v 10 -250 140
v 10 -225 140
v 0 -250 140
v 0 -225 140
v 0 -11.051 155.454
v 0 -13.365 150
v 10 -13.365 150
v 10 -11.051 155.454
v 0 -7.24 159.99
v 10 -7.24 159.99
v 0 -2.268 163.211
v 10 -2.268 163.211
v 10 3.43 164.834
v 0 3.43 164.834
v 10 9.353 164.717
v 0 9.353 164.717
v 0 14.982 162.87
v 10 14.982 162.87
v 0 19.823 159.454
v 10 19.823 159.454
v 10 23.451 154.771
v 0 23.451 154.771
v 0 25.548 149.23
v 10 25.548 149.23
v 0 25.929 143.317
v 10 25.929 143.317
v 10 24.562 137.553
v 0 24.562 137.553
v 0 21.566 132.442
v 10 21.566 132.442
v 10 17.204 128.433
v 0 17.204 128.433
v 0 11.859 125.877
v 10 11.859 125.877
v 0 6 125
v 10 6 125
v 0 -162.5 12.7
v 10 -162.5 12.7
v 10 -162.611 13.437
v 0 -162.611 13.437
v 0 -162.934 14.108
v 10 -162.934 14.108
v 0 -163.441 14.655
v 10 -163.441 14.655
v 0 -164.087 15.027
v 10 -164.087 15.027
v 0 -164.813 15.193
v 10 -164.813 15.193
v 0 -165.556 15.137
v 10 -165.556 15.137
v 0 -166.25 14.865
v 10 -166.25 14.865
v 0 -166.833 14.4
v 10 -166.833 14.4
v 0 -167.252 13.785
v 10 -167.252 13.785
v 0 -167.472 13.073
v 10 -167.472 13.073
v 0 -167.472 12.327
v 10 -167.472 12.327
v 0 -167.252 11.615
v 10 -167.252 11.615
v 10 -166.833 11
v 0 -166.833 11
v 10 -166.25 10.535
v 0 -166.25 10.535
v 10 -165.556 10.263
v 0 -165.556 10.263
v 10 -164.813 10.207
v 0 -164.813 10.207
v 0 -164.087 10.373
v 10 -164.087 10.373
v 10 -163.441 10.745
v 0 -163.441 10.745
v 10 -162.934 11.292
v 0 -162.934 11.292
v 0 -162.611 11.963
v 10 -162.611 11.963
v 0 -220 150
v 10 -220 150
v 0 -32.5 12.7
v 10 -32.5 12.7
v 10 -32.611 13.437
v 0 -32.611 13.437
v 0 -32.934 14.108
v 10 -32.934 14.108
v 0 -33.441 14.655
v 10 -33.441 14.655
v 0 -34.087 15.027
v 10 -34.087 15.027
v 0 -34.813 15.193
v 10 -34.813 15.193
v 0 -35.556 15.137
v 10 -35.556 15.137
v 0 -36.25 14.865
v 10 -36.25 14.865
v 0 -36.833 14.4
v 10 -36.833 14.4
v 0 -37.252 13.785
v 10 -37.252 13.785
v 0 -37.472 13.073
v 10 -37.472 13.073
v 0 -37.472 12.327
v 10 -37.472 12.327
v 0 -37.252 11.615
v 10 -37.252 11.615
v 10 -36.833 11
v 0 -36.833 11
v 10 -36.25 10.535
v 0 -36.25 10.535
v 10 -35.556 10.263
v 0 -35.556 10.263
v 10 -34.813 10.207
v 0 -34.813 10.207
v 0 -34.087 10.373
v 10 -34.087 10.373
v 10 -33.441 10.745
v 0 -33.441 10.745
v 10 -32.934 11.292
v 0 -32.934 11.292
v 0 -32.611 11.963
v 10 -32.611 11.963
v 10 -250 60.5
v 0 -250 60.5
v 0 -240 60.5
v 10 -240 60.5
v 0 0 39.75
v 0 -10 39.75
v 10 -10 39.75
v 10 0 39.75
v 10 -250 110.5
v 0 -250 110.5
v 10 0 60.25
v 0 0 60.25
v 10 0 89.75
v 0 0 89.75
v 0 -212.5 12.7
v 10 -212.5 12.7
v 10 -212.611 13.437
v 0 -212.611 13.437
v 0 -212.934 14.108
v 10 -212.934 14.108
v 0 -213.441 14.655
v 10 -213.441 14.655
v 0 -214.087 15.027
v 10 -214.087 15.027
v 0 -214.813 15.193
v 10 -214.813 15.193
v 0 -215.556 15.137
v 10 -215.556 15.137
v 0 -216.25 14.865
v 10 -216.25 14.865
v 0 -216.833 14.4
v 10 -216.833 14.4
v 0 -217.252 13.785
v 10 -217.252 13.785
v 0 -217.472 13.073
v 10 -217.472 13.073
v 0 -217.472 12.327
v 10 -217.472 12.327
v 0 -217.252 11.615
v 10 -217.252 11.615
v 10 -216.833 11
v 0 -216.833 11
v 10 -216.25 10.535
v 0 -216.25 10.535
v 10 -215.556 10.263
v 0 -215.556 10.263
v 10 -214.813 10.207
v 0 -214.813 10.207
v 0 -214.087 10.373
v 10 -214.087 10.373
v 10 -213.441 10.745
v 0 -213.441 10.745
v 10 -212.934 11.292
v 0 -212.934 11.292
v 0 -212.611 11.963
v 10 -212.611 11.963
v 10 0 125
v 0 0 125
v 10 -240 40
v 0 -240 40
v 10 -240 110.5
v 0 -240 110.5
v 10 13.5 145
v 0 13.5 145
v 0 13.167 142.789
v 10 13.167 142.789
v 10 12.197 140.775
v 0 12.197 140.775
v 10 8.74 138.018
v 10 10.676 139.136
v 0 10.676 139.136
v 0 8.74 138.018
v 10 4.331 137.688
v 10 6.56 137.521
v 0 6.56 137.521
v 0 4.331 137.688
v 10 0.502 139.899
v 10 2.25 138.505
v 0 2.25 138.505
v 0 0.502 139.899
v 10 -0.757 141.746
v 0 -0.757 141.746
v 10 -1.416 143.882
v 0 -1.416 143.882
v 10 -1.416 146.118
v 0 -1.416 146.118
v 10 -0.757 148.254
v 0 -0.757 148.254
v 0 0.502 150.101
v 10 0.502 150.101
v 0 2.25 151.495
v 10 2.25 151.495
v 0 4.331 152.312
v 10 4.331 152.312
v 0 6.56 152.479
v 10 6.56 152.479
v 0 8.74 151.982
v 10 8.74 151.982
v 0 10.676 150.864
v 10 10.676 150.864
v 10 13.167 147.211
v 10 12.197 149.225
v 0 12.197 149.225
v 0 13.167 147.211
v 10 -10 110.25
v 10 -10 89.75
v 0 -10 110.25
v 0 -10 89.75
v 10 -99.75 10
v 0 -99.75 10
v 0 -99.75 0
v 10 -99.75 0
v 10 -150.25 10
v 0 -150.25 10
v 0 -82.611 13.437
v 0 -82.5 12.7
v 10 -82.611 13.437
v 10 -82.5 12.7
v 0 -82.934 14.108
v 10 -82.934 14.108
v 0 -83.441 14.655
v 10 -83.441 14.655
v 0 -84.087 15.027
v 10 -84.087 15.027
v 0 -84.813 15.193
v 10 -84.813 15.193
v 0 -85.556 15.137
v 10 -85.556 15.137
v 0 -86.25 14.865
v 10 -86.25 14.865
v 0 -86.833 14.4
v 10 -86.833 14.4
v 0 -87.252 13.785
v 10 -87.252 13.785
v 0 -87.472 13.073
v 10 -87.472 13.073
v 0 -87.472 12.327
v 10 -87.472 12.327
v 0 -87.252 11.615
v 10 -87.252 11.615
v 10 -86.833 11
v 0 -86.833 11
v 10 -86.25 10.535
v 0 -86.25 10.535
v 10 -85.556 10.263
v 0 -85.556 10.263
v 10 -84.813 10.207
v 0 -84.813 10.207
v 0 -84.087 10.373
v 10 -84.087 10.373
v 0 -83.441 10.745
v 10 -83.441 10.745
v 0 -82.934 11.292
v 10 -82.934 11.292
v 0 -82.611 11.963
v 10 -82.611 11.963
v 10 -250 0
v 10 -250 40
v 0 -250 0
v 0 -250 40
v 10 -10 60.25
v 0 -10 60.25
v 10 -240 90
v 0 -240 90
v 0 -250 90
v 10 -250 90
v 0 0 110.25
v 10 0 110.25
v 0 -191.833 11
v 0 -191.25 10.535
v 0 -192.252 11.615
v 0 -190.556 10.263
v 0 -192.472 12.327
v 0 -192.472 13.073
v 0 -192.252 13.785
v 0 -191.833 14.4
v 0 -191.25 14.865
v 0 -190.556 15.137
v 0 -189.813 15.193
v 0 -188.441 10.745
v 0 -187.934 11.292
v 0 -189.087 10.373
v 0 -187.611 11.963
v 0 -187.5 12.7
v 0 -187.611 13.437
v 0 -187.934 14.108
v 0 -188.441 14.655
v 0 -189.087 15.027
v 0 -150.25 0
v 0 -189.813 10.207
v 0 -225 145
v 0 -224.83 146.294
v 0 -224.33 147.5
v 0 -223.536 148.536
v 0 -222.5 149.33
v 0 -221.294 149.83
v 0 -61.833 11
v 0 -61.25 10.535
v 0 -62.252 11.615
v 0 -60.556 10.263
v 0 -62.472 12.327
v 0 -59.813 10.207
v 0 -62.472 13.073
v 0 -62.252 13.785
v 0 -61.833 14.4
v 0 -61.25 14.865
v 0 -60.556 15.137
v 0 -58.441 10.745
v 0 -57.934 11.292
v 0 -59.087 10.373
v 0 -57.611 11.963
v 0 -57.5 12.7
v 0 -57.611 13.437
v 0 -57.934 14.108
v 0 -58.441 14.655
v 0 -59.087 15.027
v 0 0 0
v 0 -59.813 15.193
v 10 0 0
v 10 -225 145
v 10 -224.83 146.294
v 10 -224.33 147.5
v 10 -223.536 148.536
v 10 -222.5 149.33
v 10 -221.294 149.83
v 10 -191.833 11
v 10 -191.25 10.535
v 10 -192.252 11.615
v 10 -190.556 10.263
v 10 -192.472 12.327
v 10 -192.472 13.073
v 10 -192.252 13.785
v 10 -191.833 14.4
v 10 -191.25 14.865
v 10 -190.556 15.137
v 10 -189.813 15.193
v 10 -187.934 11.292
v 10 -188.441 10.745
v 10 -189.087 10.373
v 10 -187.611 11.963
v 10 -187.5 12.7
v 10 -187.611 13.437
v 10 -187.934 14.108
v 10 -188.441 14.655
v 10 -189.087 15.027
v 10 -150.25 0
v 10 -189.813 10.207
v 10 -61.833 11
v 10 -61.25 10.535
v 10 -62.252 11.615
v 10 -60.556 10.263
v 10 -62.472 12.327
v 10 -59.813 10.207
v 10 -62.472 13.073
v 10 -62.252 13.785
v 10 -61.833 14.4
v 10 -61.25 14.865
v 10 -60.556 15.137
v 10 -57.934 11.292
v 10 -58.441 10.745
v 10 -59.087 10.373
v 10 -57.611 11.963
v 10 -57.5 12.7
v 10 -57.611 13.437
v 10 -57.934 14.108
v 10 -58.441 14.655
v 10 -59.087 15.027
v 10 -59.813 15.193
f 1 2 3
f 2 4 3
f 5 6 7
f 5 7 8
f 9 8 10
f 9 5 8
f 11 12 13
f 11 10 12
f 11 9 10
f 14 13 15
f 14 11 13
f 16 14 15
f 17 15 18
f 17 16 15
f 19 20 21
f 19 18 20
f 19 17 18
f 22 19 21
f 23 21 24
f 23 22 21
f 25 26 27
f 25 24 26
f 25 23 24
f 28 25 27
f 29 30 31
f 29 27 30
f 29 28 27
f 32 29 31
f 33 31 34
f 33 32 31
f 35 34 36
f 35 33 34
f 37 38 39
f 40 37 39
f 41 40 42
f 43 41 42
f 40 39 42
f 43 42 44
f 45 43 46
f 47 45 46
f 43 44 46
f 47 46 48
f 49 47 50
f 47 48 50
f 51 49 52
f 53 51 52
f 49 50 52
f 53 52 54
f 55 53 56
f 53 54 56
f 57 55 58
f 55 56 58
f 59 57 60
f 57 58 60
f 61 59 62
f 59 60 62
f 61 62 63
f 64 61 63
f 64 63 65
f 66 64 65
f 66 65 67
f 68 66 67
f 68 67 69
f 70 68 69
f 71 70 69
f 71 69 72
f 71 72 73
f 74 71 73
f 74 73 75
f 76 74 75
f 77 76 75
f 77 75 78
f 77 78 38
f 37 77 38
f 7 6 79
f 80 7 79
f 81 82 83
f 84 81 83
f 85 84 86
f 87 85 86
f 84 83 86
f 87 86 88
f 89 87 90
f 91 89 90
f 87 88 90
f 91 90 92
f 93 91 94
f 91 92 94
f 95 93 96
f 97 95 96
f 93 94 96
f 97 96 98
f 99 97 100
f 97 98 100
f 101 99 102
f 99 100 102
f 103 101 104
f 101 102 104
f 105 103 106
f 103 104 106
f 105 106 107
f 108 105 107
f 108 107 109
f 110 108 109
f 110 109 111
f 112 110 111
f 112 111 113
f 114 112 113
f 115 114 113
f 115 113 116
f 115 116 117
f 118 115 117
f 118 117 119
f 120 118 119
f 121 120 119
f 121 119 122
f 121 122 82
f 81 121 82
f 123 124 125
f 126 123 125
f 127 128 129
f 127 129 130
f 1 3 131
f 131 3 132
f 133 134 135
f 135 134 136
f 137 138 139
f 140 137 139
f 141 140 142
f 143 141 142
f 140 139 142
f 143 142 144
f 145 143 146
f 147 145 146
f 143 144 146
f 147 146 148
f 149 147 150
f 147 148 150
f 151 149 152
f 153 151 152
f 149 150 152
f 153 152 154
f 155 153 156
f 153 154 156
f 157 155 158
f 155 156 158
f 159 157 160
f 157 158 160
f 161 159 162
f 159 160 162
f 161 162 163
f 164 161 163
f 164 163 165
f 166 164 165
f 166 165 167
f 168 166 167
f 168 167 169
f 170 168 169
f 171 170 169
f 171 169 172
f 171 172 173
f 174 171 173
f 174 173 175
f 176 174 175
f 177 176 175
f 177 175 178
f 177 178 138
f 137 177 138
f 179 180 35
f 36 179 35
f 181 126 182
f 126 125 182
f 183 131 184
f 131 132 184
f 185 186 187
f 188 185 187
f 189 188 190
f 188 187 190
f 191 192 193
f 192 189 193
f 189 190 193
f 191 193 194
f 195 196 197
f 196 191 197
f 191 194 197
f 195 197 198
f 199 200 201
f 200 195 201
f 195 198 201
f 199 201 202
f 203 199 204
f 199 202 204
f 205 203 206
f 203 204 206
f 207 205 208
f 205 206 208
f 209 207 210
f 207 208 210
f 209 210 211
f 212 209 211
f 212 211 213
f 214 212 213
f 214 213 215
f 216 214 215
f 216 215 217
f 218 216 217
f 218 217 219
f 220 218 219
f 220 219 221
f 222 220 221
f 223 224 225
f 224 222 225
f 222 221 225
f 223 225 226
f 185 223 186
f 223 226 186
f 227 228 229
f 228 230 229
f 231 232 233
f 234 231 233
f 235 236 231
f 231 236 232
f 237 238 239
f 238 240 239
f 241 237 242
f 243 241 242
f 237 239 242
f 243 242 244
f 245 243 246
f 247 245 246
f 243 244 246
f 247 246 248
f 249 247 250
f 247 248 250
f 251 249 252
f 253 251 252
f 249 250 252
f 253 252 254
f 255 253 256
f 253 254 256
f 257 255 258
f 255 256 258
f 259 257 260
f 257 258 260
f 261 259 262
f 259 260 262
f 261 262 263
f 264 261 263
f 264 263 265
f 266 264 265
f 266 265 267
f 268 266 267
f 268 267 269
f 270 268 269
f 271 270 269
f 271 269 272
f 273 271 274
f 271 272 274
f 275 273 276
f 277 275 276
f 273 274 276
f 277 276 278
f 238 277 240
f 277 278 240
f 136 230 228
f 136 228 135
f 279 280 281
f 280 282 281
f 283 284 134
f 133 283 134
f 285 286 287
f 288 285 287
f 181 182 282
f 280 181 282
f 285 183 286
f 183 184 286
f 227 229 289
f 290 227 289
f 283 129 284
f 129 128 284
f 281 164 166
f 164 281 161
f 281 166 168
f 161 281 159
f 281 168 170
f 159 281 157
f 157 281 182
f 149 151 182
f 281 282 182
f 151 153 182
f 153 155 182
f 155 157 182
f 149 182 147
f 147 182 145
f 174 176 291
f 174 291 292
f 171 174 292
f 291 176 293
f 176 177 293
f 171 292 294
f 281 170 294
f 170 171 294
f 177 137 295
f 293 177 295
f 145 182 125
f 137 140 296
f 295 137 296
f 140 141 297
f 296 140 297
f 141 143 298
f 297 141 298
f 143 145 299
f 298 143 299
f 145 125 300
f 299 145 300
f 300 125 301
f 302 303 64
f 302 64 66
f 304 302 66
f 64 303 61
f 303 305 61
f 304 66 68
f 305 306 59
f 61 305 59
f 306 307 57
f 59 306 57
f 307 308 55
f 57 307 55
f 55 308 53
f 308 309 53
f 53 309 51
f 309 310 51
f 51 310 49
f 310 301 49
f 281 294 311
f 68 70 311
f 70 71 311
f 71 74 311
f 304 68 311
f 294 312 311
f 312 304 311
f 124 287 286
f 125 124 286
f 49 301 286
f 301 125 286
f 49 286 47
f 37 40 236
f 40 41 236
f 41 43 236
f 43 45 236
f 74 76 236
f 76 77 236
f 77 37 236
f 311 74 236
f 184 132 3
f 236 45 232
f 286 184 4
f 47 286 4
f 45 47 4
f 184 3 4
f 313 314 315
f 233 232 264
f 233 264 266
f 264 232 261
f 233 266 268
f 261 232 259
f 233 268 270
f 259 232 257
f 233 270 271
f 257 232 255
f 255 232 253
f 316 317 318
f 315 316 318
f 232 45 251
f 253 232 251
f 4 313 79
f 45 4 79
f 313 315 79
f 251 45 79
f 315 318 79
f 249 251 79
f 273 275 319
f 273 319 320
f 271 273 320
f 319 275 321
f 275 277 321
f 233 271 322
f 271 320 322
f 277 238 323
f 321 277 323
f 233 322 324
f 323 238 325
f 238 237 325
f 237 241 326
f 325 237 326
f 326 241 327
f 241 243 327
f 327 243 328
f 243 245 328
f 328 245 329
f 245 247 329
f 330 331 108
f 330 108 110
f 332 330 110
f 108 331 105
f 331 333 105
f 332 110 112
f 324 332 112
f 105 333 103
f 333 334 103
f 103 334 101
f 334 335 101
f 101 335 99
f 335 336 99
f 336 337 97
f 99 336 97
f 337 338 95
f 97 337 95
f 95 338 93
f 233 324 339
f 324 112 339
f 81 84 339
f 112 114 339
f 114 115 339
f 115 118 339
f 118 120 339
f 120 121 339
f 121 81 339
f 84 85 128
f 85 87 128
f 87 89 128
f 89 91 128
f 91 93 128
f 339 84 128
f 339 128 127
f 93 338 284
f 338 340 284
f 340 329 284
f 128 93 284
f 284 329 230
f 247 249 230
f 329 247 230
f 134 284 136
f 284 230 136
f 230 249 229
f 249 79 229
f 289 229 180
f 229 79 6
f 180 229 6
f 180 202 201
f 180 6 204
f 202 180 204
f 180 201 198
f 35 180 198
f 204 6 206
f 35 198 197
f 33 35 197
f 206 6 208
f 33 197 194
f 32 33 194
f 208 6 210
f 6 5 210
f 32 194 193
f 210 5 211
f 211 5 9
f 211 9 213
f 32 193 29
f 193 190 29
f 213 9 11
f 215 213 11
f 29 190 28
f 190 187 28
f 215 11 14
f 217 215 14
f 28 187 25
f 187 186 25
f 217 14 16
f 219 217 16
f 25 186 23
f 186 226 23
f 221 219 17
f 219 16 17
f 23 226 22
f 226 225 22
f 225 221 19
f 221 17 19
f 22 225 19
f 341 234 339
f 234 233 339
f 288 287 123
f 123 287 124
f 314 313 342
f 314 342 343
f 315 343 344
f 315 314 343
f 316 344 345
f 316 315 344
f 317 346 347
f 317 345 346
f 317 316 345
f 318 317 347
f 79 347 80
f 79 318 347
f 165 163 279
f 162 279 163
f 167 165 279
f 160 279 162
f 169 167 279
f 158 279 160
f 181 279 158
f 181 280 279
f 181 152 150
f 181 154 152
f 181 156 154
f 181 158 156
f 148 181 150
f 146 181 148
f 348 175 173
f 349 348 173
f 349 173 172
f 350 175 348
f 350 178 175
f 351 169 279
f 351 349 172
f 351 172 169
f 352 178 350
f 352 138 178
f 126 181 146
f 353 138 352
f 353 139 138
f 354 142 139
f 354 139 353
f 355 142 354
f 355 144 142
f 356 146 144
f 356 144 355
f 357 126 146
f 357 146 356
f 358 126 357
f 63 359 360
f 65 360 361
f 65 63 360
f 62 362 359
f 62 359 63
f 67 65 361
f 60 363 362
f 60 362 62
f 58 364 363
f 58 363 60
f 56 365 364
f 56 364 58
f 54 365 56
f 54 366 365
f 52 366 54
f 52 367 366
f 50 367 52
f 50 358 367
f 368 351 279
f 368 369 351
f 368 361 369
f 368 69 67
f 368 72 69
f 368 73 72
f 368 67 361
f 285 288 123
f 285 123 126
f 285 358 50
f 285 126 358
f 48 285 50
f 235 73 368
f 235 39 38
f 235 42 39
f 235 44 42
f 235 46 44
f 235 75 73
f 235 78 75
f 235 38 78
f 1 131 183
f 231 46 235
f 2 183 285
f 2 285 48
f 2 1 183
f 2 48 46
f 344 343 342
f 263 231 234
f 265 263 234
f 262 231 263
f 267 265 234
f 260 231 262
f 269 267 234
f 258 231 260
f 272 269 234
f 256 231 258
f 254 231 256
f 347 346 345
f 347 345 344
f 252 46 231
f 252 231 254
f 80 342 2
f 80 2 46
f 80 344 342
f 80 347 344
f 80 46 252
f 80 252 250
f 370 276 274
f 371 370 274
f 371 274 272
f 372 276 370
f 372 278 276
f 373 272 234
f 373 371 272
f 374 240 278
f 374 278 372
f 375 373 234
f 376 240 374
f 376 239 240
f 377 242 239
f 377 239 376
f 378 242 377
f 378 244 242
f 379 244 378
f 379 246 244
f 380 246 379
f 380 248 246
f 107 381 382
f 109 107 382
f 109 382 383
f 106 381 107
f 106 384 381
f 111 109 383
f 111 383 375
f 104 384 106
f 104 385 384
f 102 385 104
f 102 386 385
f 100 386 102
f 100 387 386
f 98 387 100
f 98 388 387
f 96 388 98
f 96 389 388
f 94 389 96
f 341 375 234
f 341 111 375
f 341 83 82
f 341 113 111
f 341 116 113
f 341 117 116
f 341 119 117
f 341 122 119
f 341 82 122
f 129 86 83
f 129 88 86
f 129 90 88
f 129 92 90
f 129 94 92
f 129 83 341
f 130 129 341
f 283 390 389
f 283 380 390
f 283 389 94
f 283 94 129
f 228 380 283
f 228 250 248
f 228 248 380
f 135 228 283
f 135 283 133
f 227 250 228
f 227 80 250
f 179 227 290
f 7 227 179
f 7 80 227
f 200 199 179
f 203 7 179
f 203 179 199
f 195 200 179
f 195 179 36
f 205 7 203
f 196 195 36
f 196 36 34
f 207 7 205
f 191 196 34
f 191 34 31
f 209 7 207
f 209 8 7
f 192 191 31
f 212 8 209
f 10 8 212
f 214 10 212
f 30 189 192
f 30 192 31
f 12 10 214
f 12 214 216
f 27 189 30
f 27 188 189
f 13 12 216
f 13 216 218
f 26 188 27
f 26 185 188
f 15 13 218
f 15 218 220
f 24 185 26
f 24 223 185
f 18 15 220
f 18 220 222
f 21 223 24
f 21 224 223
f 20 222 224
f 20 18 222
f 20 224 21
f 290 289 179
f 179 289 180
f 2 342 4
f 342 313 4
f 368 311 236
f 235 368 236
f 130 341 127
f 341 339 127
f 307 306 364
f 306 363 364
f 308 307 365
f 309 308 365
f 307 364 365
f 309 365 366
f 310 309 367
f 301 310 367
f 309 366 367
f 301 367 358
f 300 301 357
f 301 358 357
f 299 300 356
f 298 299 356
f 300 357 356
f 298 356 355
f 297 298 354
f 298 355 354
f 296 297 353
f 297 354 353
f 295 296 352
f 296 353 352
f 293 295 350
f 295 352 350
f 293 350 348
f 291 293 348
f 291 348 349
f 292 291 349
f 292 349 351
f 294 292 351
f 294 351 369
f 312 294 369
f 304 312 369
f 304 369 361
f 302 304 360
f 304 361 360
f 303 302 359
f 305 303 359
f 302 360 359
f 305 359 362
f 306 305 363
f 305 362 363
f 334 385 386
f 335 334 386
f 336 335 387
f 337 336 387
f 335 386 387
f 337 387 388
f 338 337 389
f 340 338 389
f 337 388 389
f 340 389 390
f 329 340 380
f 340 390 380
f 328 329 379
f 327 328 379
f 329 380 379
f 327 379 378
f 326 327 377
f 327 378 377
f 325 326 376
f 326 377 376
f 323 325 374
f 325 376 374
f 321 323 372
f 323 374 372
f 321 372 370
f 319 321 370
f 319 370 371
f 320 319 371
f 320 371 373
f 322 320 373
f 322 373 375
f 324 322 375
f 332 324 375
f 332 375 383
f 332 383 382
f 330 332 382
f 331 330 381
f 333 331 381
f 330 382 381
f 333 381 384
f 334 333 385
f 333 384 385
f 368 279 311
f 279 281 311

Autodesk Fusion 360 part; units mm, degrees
sketch "Esquisse1" plane through (0, 0, 0) normal (1, 0, 0) x (0, 1, 0)
  line L0 (0, 0) -> (-250, 0) construction
  line L1 (-250, 0) -> (-250, 150) construction
  line L2 (-220, 150) -> (0, 150) construction
  line L3 (0, 150) -> (0, 0) construction
  line L4 (0, 0) -> (0, 39.75)
  line L5 (-10, 39.75) -> (0, 39.75)
  line L6 (-10, 39.75) -> (-10, 60.25)
  line L7 (-10, 60.25) -> (0, 60.25)
  line L8 (0, 60.25) -> (0, 89.75)
  line L9 (-10, 89.75) -> (-10, 110.25)
  line L10 (-10, 110.25) -> (0, 110.25)
  line L11 (-10, 89.75) -> (0, 89.75)
  line L12 (0, 110.25) -> (0, 125)
  line L13 (-13.3649, 150) -> (-250, 150) construction
  line L14 (11, 150) -> (1, 150) construction
  line L15 (1, 150) -> (1, 140) construction
  line L16 (1, 140) -> (11, 140) construction
  line L17 (11, 140) -> (11, 150) construction
  line L18 (11, 150) -> (1, 140) construction
  line L19 (1, 150) -> (11, 140) construction
  arc A0 (6, 125) -> (-13.3649, 150) centre (6, 145) ccw
  line L20 (-13.3649, 150) -> (-220, 150)
  line L21 (-250, 140) -> (-250, 110.5)
  line L22 (-250, 110.5) -> (-240, 110.5)
  line L23 (-240, 110.5) -> (-240, 90)
  line L24 (-240, 90) -> (-250, 90)
  line L25 (-250, 90) -> (-250, 60.5)
  line L26 (-250, 60.5) -> (-240, 60.5)
  line L27 (-240, 60.5) -> (-240, 40)
  line L28 (-240, 40) -> (-250, 40)
  line L29 (-250, 40) -> (-250, 0)
  line L30 (-250, 0) -> (-150.25, 0)
  line L31 (-150.25, 0) -> (-150.25, 10)
  line L32 (-150.25, 10) -> (-99.75, 10)
  line L33 (-99.75, 10) -> (-99.75, 0)
  line L34 (-99.75, 0) -> (0, 0)
  line L35 (-125, 150) -> (-125, 10) construction
  line L36 (-250, 75) -> (0, 75) construction
  circle A1 centre (6, 145) radius 7.5
  circle A2 centre (6, 145) radius 7.0711 construction
  line L37 (-125, 150) -> (-125, 0) construction
  line L38 (-225, 145) -> (-225, 140)
  line L39 (-225, 140) -> (-250, 140)
  line L40 (0, 140) -> (-250, 140) construction
  line L41 (0, 125) -> (6, 125)
  arc A3 (6, 125) -> (0, 125.9212) centre (6, 145) ccw construction
  arc A4 (0, 125.9212) -> (6, 125) centre (6, 145) ccw construction
  arc A5 (-220, 150) -> (-225, 145) centre (-220, 145) ccw
  point P0 (6, 145)
  point P1 (-10, 100)
  point P2 (-10, 50)
  dimension "d1" = 250
  dimension "d2" = 150
  dimension "d4" = 20.5
  dimension "d7" = 10
  dimension "d8" = 40
  dimension "d11" = 10
  dimension "d12" = 10
  dimension "d13" = 40
  dimension "d29" = 50.5
  dimension "d30" = 10
  dimension "d36" = 140
  dimension "d37" = 10
  dimension "d38" = 1
  dimension "d40" = 5
  dimension "d41" = 50
  dimension "d42" = 15
  dimension "d43" = 25
extrude "Extrusion1" add sketch "Esquisse1" along normal blind 10
sketch "Esquisse2" plane through (10, 0, 0) normal (1, 0, 0) x (0, 1, 0)
  circle A0 centre (6, 145) radius 7.5
  line L0 (-250, 140) -> (-250, 110.5)
  line L1 (-250, 110.5) -> (-240, 110.5)
  line L2 (-240, 110.5) -> (-240, 90)
  line L3 (-240, 90) -> (-250, 90)
  line L4 (-250, 90) -> (-250, 60.5)
  line L5 (-250, 60.5) -> (-240, 60.5)
  line L6 (-240, 60.5) -> (-240, 40)
  line L7 (-240, 40) -> (-250, 40)
  line L8 (-250, 40) -> (-250, 0)
  line L9 (-250, 0) -> (-150.25, 0)
  line L10 (-150.25, 0) -> (-150.25, 10)
  line L11 (-150.25, 10) -> (-99.75, 10)
  line L12 (-99.75, 10) -> (-99.75, 0)
  line L13 (-99.75, 0) -> (0, 0)
  line L14 (0, 0) -> (0, 39.75)
  line L15 (0, 39.75) -> (-10, 39.75)
  line L16 (-10, 39.75) -> (-10, 60.25)
  line L17 (-10, 60.25) -> (0, 60.25)
  line L18 (0, 60.25) -> (0, 89.75)
  line L19 (0, 89.75) -> (-10, 89.75)
  line L20 (-10, 89.75) -> (-10, 110.25)
  line L21 (-10, 110.25) -> (0, 110.25)
  line L22 (0, 110.25) -> (0, 125)
  arc A1 (6, 125) -> (-13.3649, 150) centre (6, 145) ccw
  line L23 (-13.3649, 150) -> (-220, 150)
  line L24 (-250, 12.7) -> (0, 12.7) construction
  circle A2 centre (-215, 12.7) radius 2.5
  circle A3 centre (-190, 12.7) radius 2.5
  circle A4 centre (-165, 12.7) radius 2.5
  line L25 (-250, 10.2) -> (0, 10.2) construction
  line L26 (-125, 140) -> (-125, 10)
  circle A5 centre (-35, 12.7) radius 2.5
  circle A6 centre (-85, 12.7) radius 2.5
  circle A7 centre (-60, 12.7) radius 2.5
  line L27 (-225, 145) -> (-225, 140)
  line L28 (-225, 140) -> (-250, 140)
  line L29 (0, 125) -> (6, 125)
  arc A8 (-220, 150) -> (-225, 145) centre (-220, 145) ccw
  point P0 (0, 12.7)
  point P1 (0, 10.2)
  dimension "d22" = 5
  dimension "d24" = 0.2
  dimension "d25" = 25
  dimension "d26" = 25
  dimension "d27" = 35
extrude "Extrusion2" cut sketch "Esquisse2" against normal through all contours A2 | A3 | A4 | A5 | A6 | A7
